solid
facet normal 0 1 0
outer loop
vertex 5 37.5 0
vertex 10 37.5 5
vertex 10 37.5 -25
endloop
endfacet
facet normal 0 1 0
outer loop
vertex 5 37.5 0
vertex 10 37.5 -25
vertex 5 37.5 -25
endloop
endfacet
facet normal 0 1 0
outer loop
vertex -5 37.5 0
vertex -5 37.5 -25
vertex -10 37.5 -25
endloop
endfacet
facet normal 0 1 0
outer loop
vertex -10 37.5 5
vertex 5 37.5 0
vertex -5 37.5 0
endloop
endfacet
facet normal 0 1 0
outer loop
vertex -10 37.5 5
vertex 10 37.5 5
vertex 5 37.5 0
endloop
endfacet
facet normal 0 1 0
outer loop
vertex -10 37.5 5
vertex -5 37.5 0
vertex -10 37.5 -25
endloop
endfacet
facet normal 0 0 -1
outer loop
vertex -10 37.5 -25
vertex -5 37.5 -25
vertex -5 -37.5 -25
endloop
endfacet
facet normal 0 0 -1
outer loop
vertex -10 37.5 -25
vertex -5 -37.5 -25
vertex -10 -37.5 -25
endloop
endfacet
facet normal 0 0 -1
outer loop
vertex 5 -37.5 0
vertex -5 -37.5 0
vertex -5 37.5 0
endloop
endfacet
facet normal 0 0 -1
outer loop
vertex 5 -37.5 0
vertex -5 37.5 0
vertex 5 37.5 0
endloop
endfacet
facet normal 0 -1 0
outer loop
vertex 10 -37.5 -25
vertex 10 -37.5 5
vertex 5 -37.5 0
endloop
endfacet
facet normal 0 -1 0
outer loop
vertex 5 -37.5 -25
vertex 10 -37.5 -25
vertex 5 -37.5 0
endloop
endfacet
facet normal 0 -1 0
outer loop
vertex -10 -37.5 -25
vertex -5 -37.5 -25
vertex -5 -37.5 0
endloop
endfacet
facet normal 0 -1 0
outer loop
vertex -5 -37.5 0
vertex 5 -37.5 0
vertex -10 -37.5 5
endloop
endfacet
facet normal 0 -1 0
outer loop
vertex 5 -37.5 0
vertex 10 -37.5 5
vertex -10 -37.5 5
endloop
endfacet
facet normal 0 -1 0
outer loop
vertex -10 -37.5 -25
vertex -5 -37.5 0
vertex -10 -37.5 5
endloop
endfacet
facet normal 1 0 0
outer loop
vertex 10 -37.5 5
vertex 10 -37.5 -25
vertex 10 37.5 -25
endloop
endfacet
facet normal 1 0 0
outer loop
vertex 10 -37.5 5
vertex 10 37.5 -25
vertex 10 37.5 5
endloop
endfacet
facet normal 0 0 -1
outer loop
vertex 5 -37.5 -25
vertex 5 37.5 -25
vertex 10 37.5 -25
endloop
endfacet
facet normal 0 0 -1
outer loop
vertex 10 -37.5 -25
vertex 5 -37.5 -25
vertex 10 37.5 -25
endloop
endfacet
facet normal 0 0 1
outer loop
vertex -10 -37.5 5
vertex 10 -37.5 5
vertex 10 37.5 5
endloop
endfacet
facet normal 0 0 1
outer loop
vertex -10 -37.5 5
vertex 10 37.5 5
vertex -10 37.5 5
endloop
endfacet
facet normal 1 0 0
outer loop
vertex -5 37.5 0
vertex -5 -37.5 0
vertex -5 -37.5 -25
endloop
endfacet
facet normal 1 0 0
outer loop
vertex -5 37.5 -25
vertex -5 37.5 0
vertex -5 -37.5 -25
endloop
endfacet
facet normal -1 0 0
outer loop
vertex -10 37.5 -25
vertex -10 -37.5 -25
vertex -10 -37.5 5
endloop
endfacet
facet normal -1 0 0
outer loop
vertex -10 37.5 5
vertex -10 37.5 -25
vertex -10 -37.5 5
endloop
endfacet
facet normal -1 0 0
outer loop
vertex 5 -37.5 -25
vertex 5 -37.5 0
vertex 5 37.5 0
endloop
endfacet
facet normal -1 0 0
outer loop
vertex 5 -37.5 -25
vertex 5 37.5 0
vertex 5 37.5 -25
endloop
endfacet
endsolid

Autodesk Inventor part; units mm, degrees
ref_plane "YZ Plane" through (0, 0, 0) normal (1, 0, 0) x (0, 1, 0)
ref_plane "XZ Plane" through (0, 0, 0) normal (0, 1, 0) x (-1, 0, 0)
ref_plane "XY Plane" through (0, 0, 0) normal (0, 0, 1) x (1, 0, 0)
sketch "Sketch3" plane through (0, 0, 0) normal (0, 1, 0) x (-1, 0, 0)
  line L0 (0, 0) -> (5, 0)
  line L1 (5, 0) -> (-5, 0)
  line L2 (-5, 0) -> (-5, -25)
  line L3 (-5, 0) -> (20, 0) construction
  line L4 (-5, -25) -> (-10, -25)
  line L5 (-10, -25) -> (-10, 5)
  line L6 (-10, 5) -> (0, 5)
  line L7 (0, 5) -> (5, 5)
  line L8 (5, 5) -> (5, 0)
  line L9 (5, 0) -> (5, -25)
  line L10 (5, -25) -> (10, -25)
  line L11 (10, -25) -> (10, 5)
  line L12 (10, 5) -> (5, 5)
  dimension "d2" = 5
  dimension "d3" = 10
  dimension "d4" = 0
  dimension "d5" = 25
  dimension "d6" = 90
  dimension "d7" = 5
  dimension "d8" = 30
  dimension "d9" = 5
extrude "Extrusion1" add sketch "Sketch3" along normal mid plane 75
sketch "Sketch7" plane through (5, 37.5, 0) normal (0, 0, -1) x (-1, 0, 0)
  line L0 (5, -37.5) -> (10, -37.5) construction
  line L1 (10, -37.5) -> (0, -37.5) construction
  dimension "d25" = 5
  dimension "d26" = 10
properties part number "TSU_Middle_Clamp"
